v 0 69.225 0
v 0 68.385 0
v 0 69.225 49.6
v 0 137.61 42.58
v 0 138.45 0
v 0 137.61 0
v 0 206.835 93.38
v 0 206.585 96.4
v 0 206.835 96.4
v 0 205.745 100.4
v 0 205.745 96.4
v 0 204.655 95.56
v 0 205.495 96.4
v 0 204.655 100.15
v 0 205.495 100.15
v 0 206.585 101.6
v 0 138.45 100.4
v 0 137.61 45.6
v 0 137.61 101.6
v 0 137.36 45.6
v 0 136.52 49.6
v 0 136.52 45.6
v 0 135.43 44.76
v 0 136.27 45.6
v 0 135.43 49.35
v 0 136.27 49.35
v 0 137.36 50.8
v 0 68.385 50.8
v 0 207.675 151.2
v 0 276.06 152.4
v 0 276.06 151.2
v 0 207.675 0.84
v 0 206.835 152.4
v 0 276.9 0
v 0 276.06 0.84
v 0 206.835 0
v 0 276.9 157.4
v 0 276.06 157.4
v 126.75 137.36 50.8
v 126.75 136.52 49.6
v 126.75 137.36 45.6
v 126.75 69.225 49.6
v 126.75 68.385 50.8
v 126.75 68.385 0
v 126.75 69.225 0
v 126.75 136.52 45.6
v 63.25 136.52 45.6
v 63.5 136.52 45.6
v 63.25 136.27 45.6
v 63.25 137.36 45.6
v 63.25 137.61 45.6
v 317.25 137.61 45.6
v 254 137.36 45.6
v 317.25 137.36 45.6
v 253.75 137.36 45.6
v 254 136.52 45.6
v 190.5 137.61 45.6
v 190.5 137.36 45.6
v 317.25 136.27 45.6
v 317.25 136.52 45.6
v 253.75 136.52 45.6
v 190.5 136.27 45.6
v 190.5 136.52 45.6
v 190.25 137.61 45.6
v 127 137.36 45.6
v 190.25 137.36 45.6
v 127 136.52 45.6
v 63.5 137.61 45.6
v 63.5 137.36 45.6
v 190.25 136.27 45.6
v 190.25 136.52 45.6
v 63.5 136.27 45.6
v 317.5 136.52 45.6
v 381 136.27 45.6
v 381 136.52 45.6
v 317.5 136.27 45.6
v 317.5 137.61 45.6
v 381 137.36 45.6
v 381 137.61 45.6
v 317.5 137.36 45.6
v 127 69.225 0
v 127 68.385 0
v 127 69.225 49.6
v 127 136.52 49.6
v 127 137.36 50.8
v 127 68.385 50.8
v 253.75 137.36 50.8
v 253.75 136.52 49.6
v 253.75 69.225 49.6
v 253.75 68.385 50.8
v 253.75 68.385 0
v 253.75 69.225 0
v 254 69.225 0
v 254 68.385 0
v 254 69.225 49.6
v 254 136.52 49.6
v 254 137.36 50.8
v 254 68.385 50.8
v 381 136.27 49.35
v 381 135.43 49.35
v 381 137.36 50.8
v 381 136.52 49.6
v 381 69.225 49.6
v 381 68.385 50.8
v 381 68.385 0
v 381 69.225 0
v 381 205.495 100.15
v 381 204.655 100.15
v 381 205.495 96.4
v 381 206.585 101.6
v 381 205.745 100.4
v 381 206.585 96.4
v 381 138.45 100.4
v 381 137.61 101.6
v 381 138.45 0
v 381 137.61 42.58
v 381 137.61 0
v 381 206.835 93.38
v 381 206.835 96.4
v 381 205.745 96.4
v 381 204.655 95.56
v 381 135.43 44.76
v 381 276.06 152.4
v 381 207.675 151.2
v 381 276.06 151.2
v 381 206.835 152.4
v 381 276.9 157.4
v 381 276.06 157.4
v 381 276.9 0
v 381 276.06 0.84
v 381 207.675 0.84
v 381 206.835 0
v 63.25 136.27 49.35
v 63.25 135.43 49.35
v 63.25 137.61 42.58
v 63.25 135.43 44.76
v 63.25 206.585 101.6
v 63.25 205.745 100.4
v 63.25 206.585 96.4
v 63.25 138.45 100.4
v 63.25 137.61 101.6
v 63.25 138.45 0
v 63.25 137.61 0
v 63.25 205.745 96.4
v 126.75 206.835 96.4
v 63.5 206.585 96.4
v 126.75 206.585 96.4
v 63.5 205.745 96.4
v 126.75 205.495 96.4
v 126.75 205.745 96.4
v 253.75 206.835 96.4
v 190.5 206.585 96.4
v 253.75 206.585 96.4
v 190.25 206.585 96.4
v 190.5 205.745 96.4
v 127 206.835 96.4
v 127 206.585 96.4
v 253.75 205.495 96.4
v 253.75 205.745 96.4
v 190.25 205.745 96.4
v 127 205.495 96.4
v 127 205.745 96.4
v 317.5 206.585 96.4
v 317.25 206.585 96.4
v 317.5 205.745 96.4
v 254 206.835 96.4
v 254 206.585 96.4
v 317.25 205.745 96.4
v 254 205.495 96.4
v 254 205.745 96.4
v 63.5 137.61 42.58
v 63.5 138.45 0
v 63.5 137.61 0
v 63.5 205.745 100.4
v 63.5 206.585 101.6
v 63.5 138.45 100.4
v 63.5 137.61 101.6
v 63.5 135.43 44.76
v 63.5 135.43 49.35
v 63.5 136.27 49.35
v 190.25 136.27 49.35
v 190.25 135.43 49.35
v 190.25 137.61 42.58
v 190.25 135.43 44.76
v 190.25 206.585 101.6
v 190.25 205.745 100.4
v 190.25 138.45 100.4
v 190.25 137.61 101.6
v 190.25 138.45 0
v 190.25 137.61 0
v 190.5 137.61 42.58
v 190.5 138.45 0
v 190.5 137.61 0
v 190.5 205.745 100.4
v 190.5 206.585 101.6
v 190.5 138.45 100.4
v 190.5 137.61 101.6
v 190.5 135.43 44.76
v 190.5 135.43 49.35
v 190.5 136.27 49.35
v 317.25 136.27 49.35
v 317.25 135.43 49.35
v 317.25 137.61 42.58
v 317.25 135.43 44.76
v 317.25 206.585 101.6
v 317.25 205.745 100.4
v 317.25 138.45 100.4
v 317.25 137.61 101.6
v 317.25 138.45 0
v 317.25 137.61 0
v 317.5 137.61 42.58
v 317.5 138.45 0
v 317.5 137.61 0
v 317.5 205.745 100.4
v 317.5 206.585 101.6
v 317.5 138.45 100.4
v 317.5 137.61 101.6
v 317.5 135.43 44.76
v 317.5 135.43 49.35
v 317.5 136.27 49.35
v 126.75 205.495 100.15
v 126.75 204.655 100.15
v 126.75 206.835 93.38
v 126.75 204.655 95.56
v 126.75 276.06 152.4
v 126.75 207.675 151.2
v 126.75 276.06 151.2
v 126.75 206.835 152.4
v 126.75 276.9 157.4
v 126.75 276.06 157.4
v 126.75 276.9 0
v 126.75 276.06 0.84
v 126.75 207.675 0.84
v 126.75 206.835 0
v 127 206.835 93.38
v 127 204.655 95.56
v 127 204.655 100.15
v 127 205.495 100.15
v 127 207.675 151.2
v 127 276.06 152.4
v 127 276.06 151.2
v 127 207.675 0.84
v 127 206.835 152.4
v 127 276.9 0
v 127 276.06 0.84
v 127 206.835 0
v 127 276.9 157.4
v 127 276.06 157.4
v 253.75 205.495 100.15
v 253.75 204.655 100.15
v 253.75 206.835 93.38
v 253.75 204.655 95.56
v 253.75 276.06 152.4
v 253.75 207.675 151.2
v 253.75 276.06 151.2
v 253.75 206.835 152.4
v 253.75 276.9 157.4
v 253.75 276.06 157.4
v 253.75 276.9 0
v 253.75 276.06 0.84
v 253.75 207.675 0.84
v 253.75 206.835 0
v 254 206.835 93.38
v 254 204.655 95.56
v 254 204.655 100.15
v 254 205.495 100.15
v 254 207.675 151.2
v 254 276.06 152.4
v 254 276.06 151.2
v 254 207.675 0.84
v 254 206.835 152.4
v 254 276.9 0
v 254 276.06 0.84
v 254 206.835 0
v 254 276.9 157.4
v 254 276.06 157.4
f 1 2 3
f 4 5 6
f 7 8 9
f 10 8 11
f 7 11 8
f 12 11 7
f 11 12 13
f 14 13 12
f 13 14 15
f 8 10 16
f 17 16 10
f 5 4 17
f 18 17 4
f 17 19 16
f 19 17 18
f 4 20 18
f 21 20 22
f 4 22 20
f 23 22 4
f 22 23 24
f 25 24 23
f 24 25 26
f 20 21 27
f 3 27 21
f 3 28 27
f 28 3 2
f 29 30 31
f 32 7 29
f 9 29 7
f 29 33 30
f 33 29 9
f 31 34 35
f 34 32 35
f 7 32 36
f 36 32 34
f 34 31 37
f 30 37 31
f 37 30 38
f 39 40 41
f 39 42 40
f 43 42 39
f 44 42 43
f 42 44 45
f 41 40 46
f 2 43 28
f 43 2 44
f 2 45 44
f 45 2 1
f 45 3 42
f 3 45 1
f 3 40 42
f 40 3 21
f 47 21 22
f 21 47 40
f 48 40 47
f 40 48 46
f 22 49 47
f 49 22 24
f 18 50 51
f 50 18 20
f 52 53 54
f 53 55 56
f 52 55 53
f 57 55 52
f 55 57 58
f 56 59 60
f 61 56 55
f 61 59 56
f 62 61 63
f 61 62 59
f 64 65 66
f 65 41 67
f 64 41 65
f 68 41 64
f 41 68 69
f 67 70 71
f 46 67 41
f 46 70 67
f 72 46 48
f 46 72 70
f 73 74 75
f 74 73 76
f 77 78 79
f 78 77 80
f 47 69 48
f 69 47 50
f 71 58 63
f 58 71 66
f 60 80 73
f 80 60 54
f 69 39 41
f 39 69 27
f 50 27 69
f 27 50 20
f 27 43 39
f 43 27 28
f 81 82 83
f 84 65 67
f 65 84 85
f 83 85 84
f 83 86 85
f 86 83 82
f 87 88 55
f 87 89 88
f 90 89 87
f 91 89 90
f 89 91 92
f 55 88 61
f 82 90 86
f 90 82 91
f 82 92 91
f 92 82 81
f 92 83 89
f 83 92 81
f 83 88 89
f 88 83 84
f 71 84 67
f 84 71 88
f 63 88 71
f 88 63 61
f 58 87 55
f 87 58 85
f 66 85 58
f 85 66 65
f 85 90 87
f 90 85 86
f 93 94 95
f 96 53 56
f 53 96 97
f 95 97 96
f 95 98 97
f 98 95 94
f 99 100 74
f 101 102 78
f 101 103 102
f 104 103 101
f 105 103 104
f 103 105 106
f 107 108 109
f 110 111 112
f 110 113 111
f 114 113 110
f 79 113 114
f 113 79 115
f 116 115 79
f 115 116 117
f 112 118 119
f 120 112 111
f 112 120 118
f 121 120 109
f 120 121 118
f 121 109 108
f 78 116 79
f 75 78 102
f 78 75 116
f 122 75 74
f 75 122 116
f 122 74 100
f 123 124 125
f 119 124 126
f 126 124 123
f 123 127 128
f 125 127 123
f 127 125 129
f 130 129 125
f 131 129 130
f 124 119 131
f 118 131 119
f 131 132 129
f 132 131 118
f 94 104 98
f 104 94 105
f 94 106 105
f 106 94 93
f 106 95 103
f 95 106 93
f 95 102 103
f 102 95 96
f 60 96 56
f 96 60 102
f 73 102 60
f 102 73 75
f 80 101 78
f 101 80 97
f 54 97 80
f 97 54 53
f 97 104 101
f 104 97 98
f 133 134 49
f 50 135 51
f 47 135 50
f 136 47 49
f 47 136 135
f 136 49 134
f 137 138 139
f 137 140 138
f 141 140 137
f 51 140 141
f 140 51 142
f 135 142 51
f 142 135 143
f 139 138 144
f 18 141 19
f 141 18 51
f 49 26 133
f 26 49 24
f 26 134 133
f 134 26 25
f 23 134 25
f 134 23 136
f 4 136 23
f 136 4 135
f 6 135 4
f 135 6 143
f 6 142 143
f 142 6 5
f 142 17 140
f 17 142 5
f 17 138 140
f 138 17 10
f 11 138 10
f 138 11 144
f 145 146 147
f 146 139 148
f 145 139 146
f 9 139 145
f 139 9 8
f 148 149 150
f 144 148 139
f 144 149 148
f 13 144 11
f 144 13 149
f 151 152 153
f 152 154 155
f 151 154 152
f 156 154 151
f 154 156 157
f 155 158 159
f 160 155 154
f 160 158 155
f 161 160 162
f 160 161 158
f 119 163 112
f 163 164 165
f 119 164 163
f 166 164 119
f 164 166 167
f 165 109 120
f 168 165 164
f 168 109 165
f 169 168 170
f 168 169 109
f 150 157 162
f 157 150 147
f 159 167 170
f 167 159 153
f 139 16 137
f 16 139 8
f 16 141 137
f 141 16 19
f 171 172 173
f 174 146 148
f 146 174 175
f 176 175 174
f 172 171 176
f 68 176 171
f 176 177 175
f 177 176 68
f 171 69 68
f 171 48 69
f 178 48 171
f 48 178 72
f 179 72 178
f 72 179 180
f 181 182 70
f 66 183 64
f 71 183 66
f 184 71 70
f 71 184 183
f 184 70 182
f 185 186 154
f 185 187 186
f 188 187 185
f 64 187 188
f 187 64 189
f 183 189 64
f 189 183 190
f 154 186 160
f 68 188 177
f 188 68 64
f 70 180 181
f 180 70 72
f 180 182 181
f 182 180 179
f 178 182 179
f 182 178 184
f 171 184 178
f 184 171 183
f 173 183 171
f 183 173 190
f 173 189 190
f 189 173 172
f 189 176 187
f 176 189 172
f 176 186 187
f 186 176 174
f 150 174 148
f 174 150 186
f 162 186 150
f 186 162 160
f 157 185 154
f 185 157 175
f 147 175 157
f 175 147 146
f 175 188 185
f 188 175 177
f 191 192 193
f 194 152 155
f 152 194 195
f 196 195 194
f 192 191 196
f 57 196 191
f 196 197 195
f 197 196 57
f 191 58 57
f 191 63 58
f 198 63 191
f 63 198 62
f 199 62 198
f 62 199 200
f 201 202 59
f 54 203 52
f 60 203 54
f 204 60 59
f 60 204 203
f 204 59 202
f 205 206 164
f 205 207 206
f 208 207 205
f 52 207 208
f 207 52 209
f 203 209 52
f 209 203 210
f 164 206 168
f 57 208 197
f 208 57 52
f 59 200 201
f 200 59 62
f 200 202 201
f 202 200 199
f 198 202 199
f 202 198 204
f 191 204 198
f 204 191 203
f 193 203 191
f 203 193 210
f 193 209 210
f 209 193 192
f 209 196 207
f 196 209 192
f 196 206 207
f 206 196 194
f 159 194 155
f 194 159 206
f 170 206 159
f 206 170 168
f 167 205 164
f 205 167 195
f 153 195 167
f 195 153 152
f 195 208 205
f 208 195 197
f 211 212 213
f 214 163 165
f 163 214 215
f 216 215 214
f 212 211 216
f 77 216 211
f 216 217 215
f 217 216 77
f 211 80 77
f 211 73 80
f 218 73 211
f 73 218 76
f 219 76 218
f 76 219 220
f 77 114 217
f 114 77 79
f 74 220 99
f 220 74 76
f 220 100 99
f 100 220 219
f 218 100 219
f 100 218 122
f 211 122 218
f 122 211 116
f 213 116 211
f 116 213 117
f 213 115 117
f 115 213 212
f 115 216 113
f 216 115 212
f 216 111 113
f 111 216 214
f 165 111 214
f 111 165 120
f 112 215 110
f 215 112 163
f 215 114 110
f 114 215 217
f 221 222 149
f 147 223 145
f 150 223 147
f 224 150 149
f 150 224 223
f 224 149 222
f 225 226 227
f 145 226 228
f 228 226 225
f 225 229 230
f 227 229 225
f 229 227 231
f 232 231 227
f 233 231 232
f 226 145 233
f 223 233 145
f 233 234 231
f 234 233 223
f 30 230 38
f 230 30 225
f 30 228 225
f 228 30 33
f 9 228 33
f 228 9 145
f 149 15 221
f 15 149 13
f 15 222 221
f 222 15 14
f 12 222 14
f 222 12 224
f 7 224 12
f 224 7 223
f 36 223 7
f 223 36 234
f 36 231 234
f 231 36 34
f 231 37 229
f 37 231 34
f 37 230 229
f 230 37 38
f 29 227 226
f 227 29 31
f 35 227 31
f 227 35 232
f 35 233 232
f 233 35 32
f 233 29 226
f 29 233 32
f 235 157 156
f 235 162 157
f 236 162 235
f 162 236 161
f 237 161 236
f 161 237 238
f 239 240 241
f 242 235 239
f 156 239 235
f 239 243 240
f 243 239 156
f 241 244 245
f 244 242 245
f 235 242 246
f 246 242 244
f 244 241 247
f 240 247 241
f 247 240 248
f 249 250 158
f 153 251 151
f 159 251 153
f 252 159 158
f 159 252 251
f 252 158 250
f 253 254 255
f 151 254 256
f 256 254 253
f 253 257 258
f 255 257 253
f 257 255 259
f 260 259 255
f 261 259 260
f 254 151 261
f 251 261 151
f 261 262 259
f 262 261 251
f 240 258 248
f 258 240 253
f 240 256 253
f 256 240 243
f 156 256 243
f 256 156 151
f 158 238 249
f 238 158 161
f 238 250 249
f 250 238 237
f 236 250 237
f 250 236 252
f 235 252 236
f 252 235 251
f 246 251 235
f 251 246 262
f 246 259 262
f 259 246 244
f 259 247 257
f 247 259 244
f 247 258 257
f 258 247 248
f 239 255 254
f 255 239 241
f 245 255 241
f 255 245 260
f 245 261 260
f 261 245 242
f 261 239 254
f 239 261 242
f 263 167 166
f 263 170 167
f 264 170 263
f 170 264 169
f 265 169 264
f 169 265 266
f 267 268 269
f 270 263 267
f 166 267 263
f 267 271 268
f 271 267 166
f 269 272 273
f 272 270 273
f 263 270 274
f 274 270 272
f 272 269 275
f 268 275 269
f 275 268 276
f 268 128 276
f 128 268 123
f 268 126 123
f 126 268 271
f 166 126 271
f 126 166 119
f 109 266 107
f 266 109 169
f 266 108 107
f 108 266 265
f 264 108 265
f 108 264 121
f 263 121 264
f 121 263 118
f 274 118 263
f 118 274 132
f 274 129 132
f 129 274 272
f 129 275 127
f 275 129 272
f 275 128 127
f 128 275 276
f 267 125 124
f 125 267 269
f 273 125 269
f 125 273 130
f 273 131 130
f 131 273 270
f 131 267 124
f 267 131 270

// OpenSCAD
width = 381;
depth = 276.9;
top_height = 152.4;
jar_diameter = 48;
jar_height = 100;
rows = 4;

wall = 0.84;
tread = 1.2;
hook = 4;
curb = 5;
clearance = 0.25;
bed = 180;
nest = [6, 8];
gap = 3;
explode = 0;
part = "assembly";

tiers = rows - 1;
pitch = depth / rows;
rise = top_height / tiers;
segments = ceil(width / (bed - 10));
segment = width / segments;
bracket = 2 * wall + 2 * clearance;

function y(k) = k * pitch;
function z(k) = k * rise;
function back(k) = k == tiers ? y(k + 1) : y(k + 1) - wall - clearance;
function usable(k) = back(k) - wall - y(k);

assert(usable(1) >= jar_diameter + 2 * clearance, "tread too shallow for the jar");
assert(rise > hook + tread + 2 * wall + 2 * clearance + bracket, "rise too small for the hook");
assert(segment <= bed - 10, "segment longer than the print height");

module rect(y0, y1, z0, z1) translate([y0, z0]) square([y1 - y0, z1 - z0]);

module catch(k) {
    face = y(k) - wall;
    floor_top = z(k - 1) - tread - hook;
    rect(face - bracket, face, floor_top - wall, floor_top);
    rect(face - bracket, face - bracket + wall, floor_top - wall, z(k - 1) - tread - clearance);
    polygon([[face, floor_top - wall], [face - bracket, floor_top - wall], [face, floor_top - wall - bracket]]);
}

module profile(k) {
    rect(y(k) - wall, y(k), 0, z(k));
    rect(y(k) - wall, back(k), z(k) - tread, z(k));
    if (k > 1) catch(k);
    if (k < tiers) {
        rect(back(k) - wall, back(k), z(k) - tread - hook, z(k));
    } else {
        rect(back(k) - wall, back(k), 0, z(k) + curb);
        rect(y(k) - wall, back(k), 0, wall);
    }
}

function left(k) = y(k) - wall - (k > 1 ? bracket : 0);
function extent(k) = [back(k) - left(k), z(k) + (k == tiers ? curb : 0)];

module piece(k, length) linear_extrude(length) translate([-left(k), 0]) profile(k);

function seams(k) = k % 2 == 0
    ? concat([0], [for (i = [0 : segments - 1]) (i + 0.5) * segment], [width])
    : [for (i = [0 : segments]) i * segment];

module tier(k) {
    s = seams(k);
    for (i = [0 : len(s) - 2])
        translate([s[i] + i * explode, left(k), 0]) rotate([90, 0, 90])
            piece(k, s[i + 1] - s[i] - (i < len(s) - 2 ? clearance : 0));
}

module rack() for (k = [1 : tiers]) tier(k);

module jar() {
    color([0.85, 0.9, 0.95]) cylinder(d = jar_diameter, h = jar_height * 0.82, $fn = 48);
    color("dimgray") translate([0, 0, jar_height * 0.82]) cylinder(d = jar_diameter * 0.9, h = jar_height * 0.18, $fn = 48);
    color("firebrick") translate([0, 0, jar_height * 0.3]) cylinder(d = jar_diameter + 0.6, h = jar_height * 0.4, $fn = 48);
}

module jars() {
    n = floor(width / (jar_diameter + 4));
    step = width / n;
    for (r = [0 : tiers], i = [0 : n - 1]) {
        y0 = r == 0 ? 0 : y(r);
        y1 = r == 0 ? y(1) - wall : back(r) - wall;
        translate([(i + 0.5) * step, (y0 + y1) / 2, z(r)]) jar();
    }
}

full = segment - clearance;
half = segment / 2 - clearance;

module stack(k, lengths) {
    n = len(lengths);
    for (i = [0 : n - 1]) translate([(n - 1 - i) * nest[0], i * nest[1], 0]) piece(k, lengths[i]);
}

module standing(length) {
    e = extent(1);
    translate([e[1], 0, 0]) rotate([0, 0, 90]) piece(1, length);
}

module tube_with(count) {
    piece(tiers, full);
    e = extent(1);
    inner = [y(tiers + 1) - wall - y(tiers), z(tiers) - tread - wall];
    spacing = (inner[1] - count * e[0]) / (count + 1);
    assert(e[1] + 2 * gap <= inner[0] && spacing >= gap, "tier 1 does not fit inside the top tier");
    if (count > 0) for (j = [0 : count - 1])
        translate([y(tiers) - left(tiers) + (inner[0] - e[1]) / 2, wall + spacing + j * (e[0] + spacing), 0]) standing(full);
}

module plate(n) {
    t = extent(tiers);
    s = extent(2) + 3 * nest;
    w = n == 1 ? 2 * t[0] + gap : t[0] + gap + s[0];
    h = max(t[1], s[1]);
    assert(w <= bed && h <= bed, "plate overflows the bed");
    translate([-w / 2, -h / 2, 0]) {
        tube_with(n == 1 ? 2 : 1);
        translate([t[0] + gap, 0, 0])
            if (n == 1) tube_with(0); else stack(2, [full, full, half, half]);
    }
}

if (part == "assembly") rack();
if (part == "scene") { color("burlywood") rack(); jars(); }
if (part == "split") for (k = [1 : tiers]) color(k % 2 == 0 ? "peru" : "burlywood") tier(k);
if (part == "tier1") piece(1, full);
if (part == "tier2") piece(2, full);
if (part == "tier2_end") piece(2, half);
if (part == "tier3") piece(3, full);
if (part == "plate_1") plate(1);
if (part == "plate_2") plate(2);
